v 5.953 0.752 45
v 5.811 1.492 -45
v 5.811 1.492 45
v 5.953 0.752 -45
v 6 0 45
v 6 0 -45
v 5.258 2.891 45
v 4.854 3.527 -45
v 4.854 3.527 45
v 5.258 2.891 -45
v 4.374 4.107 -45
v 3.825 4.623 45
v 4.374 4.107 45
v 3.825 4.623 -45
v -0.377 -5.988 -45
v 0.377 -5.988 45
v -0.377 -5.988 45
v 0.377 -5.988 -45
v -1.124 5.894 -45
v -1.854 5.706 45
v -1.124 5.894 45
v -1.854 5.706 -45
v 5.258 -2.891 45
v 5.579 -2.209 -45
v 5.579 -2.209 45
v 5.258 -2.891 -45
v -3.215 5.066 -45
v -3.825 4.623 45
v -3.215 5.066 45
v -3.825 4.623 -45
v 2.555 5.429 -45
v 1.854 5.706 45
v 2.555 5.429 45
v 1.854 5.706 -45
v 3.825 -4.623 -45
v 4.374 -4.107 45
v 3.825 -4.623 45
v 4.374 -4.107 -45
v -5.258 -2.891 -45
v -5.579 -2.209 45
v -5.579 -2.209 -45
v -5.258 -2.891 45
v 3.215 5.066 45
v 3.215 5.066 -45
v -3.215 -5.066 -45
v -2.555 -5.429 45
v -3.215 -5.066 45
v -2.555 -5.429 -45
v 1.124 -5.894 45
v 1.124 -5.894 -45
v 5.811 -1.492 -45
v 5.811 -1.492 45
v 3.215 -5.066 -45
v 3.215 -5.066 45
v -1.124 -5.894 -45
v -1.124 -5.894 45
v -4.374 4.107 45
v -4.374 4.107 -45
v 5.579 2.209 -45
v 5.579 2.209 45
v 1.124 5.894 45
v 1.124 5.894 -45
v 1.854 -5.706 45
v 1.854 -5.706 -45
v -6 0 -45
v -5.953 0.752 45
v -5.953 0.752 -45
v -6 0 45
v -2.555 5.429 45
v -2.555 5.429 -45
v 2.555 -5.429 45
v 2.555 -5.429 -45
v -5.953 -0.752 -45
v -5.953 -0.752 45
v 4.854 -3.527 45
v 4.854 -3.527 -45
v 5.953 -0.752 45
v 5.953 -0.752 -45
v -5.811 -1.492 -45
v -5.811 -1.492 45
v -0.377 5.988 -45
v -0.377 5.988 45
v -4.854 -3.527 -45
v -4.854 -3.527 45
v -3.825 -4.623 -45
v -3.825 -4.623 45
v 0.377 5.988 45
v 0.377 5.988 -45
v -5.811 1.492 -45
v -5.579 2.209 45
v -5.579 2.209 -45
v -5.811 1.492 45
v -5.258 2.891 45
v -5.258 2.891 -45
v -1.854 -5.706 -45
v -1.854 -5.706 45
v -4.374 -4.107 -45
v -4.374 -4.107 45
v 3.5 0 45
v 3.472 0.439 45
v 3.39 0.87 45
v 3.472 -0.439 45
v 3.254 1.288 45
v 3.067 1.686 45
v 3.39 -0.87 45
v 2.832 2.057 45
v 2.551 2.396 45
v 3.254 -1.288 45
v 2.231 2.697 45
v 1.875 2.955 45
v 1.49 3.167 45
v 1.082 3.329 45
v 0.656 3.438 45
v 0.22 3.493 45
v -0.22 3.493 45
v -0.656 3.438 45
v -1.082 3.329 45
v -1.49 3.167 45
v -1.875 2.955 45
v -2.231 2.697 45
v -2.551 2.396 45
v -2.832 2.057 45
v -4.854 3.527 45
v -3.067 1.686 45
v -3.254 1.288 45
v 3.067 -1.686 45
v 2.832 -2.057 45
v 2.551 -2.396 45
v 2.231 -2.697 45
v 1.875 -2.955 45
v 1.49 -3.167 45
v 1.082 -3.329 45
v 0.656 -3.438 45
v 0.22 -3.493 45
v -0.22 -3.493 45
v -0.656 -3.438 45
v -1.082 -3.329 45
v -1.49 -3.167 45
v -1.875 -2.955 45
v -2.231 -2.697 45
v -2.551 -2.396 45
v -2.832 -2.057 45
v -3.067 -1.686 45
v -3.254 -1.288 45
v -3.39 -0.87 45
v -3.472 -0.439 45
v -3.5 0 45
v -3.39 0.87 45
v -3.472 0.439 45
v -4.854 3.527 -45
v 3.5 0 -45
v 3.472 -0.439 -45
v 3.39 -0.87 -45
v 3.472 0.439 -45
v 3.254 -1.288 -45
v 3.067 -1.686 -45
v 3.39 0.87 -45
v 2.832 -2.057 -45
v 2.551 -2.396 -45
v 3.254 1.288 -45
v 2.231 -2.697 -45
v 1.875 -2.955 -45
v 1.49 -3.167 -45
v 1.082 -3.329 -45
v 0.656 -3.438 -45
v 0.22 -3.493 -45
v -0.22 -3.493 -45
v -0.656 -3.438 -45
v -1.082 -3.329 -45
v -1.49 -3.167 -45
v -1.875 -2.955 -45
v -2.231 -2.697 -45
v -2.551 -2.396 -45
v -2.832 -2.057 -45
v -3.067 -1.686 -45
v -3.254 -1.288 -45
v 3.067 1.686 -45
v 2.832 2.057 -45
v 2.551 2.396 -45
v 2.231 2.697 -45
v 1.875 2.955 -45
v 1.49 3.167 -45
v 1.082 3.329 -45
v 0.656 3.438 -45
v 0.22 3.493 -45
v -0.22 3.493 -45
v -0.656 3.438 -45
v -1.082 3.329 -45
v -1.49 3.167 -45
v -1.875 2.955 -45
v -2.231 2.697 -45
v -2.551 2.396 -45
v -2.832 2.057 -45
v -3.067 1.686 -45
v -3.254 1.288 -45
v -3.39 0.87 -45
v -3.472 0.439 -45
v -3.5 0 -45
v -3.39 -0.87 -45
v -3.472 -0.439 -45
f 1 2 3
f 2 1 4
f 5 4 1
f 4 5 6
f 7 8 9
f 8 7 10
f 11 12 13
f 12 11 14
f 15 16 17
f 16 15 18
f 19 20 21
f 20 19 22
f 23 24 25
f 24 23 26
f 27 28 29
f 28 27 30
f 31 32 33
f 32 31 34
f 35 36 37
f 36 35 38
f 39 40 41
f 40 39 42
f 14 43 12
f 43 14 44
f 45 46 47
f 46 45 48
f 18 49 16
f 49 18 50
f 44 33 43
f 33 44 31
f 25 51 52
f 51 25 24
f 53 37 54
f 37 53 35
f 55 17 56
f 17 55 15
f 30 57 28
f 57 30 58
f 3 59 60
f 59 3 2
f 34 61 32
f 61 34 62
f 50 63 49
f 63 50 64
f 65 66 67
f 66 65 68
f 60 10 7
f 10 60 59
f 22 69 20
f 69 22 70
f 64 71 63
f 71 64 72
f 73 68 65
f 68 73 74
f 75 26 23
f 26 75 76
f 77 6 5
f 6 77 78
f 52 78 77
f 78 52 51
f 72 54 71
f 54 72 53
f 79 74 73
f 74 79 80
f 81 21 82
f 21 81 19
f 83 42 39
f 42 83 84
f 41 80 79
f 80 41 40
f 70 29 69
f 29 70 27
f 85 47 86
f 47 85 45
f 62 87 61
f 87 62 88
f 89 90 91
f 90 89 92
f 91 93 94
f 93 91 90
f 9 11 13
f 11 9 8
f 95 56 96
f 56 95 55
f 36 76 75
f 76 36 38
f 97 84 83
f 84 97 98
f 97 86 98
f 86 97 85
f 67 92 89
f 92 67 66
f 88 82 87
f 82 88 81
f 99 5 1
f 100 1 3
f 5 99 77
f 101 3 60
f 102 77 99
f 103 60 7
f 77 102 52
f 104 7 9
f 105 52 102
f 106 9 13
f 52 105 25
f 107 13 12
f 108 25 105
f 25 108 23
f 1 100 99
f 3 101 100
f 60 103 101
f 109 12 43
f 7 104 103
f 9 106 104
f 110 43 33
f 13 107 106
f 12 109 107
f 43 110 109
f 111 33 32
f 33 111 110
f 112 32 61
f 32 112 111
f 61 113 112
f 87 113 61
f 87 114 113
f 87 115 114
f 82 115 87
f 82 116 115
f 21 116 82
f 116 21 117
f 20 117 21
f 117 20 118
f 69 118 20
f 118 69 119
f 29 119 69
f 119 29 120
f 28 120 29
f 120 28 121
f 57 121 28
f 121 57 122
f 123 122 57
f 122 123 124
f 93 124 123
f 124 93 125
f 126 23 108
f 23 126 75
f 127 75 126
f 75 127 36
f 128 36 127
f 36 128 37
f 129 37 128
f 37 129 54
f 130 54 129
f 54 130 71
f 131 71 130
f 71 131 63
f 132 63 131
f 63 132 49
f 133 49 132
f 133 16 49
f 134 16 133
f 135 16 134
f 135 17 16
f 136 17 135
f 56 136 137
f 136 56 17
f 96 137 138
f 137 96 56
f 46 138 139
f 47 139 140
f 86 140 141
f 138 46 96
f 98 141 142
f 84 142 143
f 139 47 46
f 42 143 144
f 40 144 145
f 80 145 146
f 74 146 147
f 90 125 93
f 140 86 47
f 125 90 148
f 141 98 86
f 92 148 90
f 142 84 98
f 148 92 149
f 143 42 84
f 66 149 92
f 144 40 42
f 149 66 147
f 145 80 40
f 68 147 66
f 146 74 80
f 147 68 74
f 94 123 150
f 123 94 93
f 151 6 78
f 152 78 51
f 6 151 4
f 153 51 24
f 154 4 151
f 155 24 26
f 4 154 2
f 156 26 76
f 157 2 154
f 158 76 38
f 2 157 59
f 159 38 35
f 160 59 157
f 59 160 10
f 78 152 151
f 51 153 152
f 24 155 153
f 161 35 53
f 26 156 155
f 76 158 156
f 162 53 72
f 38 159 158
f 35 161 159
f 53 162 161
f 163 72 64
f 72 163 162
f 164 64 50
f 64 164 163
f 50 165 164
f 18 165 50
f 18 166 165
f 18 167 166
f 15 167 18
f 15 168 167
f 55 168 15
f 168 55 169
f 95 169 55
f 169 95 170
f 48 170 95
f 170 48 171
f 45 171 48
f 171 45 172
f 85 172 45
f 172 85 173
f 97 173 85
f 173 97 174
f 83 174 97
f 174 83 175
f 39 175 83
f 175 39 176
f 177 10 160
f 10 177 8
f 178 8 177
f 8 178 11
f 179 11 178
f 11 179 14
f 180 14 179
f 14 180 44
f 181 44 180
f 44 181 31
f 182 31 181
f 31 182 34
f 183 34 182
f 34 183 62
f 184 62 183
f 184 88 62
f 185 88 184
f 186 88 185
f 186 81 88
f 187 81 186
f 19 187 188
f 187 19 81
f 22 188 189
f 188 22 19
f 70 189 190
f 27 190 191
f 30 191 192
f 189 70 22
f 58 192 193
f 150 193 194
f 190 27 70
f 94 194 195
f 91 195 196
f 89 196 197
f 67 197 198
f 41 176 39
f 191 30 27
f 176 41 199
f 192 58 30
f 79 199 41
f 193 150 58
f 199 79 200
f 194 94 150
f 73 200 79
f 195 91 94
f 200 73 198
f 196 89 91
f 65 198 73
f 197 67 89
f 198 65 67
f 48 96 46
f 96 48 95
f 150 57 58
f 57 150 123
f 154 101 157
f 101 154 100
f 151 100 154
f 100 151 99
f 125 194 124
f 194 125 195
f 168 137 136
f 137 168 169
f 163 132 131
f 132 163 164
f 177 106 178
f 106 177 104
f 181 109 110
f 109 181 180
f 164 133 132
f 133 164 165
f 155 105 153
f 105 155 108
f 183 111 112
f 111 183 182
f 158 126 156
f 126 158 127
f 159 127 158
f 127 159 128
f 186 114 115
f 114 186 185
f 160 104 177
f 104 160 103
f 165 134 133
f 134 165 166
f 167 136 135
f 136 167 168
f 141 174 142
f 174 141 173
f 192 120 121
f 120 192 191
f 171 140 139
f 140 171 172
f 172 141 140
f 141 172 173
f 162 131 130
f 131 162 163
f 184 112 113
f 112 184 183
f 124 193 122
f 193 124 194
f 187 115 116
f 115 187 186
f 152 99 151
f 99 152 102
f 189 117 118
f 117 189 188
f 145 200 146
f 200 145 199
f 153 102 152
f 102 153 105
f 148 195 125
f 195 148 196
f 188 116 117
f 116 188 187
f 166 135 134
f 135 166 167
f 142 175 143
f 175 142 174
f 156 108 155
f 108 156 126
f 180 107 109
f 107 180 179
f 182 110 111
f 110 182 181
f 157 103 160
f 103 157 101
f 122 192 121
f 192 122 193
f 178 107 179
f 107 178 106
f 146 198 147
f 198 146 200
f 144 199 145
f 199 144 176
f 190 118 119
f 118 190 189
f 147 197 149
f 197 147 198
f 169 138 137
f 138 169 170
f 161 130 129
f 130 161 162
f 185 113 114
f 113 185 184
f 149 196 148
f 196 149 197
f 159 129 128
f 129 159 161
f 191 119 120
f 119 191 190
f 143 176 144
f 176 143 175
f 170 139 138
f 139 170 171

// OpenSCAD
$fn = 50;


difference() {
	union() {
		translate(v = [0, 0, -45.0000000000]) {
			cylinder(h = 90, r = 6.0000000000);
		}
	}
	union() {
		translate(v = [0, 0, -100.0000000000]) {
			cylinder(h = 200, r = 3.5000000000);
		}
	}
}
